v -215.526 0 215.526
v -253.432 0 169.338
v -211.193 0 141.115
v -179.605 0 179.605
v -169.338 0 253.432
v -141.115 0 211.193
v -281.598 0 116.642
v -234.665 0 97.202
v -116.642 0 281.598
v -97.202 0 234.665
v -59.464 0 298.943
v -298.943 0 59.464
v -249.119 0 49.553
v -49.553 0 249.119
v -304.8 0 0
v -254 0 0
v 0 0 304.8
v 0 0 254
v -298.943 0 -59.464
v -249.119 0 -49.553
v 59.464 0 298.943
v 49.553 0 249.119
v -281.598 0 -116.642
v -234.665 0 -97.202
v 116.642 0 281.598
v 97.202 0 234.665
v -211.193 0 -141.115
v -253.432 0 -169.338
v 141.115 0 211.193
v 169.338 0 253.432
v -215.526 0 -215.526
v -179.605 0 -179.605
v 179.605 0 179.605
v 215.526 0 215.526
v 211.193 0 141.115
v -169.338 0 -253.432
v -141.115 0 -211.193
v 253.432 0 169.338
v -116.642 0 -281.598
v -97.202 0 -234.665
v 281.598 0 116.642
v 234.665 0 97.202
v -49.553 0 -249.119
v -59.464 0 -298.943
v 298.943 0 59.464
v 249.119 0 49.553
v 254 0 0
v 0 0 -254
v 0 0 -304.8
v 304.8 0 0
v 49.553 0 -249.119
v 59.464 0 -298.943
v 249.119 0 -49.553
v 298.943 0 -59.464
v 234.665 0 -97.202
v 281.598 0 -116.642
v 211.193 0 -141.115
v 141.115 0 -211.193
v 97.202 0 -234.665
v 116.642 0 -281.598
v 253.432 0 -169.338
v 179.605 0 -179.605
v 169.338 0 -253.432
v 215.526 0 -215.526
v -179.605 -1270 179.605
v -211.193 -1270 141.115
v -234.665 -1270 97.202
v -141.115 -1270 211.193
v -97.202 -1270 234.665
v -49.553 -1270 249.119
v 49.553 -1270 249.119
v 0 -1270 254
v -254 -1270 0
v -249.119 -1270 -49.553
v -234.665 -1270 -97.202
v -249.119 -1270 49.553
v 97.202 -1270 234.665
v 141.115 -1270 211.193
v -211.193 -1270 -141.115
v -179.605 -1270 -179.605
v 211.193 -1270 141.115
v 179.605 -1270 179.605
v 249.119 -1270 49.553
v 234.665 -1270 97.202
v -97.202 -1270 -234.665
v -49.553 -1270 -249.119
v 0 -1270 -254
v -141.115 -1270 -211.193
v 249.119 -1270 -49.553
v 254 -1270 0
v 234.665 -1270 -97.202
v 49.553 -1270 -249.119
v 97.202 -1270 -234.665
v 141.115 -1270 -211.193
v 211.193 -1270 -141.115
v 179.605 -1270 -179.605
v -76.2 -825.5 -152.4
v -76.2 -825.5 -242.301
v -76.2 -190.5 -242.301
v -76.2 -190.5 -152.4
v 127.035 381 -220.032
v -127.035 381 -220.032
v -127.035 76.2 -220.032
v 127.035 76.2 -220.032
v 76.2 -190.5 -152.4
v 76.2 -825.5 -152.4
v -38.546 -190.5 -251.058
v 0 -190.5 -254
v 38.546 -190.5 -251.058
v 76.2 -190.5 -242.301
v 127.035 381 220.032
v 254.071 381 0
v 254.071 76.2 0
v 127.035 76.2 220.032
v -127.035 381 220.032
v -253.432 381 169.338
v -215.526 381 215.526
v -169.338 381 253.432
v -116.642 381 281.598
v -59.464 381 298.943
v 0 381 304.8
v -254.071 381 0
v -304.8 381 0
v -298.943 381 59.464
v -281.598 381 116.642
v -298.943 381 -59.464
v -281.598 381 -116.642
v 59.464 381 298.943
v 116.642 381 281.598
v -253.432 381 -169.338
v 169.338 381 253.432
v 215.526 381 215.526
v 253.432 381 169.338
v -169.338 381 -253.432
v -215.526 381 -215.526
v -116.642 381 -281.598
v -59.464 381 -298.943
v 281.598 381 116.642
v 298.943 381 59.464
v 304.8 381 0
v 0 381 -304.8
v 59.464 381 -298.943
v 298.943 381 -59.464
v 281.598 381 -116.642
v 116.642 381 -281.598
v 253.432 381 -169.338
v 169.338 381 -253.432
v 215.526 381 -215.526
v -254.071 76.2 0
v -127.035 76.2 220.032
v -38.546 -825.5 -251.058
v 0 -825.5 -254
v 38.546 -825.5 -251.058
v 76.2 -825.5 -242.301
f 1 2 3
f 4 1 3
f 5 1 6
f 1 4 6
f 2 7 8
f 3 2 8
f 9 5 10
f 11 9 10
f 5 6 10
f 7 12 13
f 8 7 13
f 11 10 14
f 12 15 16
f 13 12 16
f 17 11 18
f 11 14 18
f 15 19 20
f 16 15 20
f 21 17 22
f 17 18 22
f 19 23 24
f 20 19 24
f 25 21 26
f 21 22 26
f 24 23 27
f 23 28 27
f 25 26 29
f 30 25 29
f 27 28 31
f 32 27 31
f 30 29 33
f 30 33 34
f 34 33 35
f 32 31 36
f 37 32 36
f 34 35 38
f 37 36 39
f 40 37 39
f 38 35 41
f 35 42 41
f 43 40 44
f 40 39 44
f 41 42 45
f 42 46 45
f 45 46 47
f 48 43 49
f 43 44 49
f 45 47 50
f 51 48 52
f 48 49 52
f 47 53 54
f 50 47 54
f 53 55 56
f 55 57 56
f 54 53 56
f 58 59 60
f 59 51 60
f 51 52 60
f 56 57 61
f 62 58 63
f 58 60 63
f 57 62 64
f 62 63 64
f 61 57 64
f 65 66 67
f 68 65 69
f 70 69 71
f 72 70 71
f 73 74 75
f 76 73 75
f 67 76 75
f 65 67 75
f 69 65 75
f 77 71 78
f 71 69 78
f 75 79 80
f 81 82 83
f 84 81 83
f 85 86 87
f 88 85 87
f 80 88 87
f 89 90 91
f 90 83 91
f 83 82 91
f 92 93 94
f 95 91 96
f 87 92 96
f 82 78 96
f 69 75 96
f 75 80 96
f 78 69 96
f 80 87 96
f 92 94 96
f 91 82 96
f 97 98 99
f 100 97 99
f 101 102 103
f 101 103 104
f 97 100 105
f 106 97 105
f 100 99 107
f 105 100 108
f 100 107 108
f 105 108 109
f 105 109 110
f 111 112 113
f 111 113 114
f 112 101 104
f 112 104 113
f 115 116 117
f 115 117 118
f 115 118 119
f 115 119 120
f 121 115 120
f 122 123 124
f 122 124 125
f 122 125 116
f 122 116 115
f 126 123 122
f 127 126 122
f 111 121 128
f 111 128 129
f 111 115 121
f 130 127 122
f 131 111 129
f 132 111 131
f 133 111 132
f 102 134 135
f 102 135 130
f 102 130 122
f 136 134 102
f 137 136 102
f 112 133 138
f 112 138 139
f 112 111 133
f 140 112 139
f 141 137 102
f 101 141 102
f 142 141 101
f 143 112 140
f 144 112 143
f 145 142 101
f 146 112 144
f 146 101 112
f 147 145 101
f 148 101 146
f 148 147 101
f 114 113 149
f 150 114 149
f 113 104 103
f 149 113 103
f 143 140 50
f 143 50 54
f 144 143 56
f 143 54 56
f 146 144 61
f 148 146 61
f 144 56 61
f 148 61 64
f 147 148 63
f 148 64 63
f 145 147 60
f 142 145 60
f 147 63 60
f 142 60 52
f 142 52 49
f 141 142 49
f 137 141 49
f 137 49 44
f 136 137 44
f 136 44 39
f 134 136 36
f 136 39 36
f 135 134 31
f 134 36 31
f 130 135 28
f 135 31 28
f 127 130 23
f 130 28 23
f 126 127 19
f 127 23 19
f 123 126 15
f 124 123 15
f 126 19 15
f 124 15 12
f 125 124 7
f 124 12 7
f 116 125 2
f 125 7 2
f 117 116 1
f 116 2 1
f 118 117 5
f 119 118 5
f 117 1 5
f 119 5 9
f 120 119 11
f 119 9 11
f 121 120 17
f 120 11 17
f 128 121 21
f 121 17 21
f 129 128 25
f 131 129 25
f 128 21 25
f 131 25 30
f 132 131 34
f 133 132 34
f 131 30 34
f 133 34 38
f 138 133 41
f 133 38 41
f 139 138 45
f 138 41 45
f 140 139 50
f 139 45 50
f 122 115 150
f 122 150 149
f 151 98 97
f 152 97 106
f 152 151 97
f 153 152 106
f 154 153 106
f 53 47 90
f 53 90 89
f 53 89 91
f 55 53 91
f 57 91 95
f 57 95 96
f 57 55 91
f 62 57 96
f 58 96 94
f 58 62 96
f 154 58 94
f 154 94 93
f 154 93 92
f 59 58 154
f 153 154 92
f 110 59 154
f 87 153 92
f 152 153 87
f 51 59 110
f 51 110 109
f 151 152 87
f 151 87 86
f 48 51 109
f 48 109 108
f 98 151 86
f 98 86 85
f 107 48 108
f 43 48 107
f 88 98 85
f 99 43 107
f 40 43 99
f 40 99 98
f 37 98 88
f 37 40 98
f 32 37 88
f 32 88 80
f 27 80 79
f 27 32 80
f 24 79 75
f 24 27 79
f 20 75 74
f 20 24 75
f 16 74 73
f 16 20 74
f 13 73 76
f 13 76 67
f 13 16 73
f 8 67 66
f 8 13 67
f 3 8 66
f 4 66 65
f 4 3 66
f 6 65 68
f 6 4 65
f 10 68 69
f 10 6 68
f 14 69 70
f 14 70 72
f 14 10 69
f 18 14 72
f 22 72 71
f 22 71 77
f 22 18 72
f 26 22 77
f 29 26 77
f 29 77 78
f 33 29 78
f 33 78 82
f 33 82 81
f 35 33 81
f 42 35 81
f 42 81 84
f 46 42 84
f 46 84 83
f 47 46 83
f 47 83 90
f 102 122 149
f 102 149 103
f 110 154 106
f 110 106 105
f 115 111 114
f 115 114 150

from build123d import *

# Parameters (mm, degrees)
SKETCH1_R           = 254
BOSS_EXTRUDE1_DEPTH = 1270
SKETCH2_R           = 304.8
BOSS_EXTRUDE2_DEPTH = 381
CUT_EXTRUDE1_DEPTH  = 304.8
SKETCH4_W           = 152.4
SKETCH4_H           = 635
CUT_EXTRUDE2_DEPTH  = 101.6


with BuildPart() as part:
    # Sketch1 → Boss-Extrude1 (new body)
    with BuildSketch(Plane(origin=(0, 0, 0), x_dir=(1, 0, 0), z_dir=(0, 1, 0))):
        Circle(SKETCH1_R)
    extrude(amount=-BOSS_EXTRUDE1_DEPTH)

    # Sketch2 → Boss-Extrude2 (add)
    with BuildSketch(Plane(origin=(0, 0, 0), x_dir=(1, 0, 0), z_dir=(0, 1, 0))):
        Circle(SKETCH2_R)
    extrude(amount=BOSS_EXTRUDE2_DEPTH)

    # Sketch3 → Cut-Extrude1 (cut)
    with BuildSketch(Plane(origin=(0, 381, 0), x_dir=(1, 0, 0), z_dir=(0, 1, 0))):
        Polygon((-127.035376657, 220.031726729), (127.035376657, 220.031726729), (254.070753314, 0), (127.035376657, -220.031726729), (-127.035376657, -220.031726729), (-254.070753314, 0), align=None)
    extrude(amount=-CUT_EXTRUDE1_DEPTH, mode=Mode.SUBTRACT)

    # Sketch4 → Cut-Extrude2 (cut)
    with BuildSketch(Plane.XY.offset(-254)):
        with Locations((0, -508)):
            Rectangle(SKETCH4_W, SKETCH4_H)
    extrude(amount=CUT_EXTRUDE2_DEPTH, mode=Mode.SUBTRACT)


solid = part.part
